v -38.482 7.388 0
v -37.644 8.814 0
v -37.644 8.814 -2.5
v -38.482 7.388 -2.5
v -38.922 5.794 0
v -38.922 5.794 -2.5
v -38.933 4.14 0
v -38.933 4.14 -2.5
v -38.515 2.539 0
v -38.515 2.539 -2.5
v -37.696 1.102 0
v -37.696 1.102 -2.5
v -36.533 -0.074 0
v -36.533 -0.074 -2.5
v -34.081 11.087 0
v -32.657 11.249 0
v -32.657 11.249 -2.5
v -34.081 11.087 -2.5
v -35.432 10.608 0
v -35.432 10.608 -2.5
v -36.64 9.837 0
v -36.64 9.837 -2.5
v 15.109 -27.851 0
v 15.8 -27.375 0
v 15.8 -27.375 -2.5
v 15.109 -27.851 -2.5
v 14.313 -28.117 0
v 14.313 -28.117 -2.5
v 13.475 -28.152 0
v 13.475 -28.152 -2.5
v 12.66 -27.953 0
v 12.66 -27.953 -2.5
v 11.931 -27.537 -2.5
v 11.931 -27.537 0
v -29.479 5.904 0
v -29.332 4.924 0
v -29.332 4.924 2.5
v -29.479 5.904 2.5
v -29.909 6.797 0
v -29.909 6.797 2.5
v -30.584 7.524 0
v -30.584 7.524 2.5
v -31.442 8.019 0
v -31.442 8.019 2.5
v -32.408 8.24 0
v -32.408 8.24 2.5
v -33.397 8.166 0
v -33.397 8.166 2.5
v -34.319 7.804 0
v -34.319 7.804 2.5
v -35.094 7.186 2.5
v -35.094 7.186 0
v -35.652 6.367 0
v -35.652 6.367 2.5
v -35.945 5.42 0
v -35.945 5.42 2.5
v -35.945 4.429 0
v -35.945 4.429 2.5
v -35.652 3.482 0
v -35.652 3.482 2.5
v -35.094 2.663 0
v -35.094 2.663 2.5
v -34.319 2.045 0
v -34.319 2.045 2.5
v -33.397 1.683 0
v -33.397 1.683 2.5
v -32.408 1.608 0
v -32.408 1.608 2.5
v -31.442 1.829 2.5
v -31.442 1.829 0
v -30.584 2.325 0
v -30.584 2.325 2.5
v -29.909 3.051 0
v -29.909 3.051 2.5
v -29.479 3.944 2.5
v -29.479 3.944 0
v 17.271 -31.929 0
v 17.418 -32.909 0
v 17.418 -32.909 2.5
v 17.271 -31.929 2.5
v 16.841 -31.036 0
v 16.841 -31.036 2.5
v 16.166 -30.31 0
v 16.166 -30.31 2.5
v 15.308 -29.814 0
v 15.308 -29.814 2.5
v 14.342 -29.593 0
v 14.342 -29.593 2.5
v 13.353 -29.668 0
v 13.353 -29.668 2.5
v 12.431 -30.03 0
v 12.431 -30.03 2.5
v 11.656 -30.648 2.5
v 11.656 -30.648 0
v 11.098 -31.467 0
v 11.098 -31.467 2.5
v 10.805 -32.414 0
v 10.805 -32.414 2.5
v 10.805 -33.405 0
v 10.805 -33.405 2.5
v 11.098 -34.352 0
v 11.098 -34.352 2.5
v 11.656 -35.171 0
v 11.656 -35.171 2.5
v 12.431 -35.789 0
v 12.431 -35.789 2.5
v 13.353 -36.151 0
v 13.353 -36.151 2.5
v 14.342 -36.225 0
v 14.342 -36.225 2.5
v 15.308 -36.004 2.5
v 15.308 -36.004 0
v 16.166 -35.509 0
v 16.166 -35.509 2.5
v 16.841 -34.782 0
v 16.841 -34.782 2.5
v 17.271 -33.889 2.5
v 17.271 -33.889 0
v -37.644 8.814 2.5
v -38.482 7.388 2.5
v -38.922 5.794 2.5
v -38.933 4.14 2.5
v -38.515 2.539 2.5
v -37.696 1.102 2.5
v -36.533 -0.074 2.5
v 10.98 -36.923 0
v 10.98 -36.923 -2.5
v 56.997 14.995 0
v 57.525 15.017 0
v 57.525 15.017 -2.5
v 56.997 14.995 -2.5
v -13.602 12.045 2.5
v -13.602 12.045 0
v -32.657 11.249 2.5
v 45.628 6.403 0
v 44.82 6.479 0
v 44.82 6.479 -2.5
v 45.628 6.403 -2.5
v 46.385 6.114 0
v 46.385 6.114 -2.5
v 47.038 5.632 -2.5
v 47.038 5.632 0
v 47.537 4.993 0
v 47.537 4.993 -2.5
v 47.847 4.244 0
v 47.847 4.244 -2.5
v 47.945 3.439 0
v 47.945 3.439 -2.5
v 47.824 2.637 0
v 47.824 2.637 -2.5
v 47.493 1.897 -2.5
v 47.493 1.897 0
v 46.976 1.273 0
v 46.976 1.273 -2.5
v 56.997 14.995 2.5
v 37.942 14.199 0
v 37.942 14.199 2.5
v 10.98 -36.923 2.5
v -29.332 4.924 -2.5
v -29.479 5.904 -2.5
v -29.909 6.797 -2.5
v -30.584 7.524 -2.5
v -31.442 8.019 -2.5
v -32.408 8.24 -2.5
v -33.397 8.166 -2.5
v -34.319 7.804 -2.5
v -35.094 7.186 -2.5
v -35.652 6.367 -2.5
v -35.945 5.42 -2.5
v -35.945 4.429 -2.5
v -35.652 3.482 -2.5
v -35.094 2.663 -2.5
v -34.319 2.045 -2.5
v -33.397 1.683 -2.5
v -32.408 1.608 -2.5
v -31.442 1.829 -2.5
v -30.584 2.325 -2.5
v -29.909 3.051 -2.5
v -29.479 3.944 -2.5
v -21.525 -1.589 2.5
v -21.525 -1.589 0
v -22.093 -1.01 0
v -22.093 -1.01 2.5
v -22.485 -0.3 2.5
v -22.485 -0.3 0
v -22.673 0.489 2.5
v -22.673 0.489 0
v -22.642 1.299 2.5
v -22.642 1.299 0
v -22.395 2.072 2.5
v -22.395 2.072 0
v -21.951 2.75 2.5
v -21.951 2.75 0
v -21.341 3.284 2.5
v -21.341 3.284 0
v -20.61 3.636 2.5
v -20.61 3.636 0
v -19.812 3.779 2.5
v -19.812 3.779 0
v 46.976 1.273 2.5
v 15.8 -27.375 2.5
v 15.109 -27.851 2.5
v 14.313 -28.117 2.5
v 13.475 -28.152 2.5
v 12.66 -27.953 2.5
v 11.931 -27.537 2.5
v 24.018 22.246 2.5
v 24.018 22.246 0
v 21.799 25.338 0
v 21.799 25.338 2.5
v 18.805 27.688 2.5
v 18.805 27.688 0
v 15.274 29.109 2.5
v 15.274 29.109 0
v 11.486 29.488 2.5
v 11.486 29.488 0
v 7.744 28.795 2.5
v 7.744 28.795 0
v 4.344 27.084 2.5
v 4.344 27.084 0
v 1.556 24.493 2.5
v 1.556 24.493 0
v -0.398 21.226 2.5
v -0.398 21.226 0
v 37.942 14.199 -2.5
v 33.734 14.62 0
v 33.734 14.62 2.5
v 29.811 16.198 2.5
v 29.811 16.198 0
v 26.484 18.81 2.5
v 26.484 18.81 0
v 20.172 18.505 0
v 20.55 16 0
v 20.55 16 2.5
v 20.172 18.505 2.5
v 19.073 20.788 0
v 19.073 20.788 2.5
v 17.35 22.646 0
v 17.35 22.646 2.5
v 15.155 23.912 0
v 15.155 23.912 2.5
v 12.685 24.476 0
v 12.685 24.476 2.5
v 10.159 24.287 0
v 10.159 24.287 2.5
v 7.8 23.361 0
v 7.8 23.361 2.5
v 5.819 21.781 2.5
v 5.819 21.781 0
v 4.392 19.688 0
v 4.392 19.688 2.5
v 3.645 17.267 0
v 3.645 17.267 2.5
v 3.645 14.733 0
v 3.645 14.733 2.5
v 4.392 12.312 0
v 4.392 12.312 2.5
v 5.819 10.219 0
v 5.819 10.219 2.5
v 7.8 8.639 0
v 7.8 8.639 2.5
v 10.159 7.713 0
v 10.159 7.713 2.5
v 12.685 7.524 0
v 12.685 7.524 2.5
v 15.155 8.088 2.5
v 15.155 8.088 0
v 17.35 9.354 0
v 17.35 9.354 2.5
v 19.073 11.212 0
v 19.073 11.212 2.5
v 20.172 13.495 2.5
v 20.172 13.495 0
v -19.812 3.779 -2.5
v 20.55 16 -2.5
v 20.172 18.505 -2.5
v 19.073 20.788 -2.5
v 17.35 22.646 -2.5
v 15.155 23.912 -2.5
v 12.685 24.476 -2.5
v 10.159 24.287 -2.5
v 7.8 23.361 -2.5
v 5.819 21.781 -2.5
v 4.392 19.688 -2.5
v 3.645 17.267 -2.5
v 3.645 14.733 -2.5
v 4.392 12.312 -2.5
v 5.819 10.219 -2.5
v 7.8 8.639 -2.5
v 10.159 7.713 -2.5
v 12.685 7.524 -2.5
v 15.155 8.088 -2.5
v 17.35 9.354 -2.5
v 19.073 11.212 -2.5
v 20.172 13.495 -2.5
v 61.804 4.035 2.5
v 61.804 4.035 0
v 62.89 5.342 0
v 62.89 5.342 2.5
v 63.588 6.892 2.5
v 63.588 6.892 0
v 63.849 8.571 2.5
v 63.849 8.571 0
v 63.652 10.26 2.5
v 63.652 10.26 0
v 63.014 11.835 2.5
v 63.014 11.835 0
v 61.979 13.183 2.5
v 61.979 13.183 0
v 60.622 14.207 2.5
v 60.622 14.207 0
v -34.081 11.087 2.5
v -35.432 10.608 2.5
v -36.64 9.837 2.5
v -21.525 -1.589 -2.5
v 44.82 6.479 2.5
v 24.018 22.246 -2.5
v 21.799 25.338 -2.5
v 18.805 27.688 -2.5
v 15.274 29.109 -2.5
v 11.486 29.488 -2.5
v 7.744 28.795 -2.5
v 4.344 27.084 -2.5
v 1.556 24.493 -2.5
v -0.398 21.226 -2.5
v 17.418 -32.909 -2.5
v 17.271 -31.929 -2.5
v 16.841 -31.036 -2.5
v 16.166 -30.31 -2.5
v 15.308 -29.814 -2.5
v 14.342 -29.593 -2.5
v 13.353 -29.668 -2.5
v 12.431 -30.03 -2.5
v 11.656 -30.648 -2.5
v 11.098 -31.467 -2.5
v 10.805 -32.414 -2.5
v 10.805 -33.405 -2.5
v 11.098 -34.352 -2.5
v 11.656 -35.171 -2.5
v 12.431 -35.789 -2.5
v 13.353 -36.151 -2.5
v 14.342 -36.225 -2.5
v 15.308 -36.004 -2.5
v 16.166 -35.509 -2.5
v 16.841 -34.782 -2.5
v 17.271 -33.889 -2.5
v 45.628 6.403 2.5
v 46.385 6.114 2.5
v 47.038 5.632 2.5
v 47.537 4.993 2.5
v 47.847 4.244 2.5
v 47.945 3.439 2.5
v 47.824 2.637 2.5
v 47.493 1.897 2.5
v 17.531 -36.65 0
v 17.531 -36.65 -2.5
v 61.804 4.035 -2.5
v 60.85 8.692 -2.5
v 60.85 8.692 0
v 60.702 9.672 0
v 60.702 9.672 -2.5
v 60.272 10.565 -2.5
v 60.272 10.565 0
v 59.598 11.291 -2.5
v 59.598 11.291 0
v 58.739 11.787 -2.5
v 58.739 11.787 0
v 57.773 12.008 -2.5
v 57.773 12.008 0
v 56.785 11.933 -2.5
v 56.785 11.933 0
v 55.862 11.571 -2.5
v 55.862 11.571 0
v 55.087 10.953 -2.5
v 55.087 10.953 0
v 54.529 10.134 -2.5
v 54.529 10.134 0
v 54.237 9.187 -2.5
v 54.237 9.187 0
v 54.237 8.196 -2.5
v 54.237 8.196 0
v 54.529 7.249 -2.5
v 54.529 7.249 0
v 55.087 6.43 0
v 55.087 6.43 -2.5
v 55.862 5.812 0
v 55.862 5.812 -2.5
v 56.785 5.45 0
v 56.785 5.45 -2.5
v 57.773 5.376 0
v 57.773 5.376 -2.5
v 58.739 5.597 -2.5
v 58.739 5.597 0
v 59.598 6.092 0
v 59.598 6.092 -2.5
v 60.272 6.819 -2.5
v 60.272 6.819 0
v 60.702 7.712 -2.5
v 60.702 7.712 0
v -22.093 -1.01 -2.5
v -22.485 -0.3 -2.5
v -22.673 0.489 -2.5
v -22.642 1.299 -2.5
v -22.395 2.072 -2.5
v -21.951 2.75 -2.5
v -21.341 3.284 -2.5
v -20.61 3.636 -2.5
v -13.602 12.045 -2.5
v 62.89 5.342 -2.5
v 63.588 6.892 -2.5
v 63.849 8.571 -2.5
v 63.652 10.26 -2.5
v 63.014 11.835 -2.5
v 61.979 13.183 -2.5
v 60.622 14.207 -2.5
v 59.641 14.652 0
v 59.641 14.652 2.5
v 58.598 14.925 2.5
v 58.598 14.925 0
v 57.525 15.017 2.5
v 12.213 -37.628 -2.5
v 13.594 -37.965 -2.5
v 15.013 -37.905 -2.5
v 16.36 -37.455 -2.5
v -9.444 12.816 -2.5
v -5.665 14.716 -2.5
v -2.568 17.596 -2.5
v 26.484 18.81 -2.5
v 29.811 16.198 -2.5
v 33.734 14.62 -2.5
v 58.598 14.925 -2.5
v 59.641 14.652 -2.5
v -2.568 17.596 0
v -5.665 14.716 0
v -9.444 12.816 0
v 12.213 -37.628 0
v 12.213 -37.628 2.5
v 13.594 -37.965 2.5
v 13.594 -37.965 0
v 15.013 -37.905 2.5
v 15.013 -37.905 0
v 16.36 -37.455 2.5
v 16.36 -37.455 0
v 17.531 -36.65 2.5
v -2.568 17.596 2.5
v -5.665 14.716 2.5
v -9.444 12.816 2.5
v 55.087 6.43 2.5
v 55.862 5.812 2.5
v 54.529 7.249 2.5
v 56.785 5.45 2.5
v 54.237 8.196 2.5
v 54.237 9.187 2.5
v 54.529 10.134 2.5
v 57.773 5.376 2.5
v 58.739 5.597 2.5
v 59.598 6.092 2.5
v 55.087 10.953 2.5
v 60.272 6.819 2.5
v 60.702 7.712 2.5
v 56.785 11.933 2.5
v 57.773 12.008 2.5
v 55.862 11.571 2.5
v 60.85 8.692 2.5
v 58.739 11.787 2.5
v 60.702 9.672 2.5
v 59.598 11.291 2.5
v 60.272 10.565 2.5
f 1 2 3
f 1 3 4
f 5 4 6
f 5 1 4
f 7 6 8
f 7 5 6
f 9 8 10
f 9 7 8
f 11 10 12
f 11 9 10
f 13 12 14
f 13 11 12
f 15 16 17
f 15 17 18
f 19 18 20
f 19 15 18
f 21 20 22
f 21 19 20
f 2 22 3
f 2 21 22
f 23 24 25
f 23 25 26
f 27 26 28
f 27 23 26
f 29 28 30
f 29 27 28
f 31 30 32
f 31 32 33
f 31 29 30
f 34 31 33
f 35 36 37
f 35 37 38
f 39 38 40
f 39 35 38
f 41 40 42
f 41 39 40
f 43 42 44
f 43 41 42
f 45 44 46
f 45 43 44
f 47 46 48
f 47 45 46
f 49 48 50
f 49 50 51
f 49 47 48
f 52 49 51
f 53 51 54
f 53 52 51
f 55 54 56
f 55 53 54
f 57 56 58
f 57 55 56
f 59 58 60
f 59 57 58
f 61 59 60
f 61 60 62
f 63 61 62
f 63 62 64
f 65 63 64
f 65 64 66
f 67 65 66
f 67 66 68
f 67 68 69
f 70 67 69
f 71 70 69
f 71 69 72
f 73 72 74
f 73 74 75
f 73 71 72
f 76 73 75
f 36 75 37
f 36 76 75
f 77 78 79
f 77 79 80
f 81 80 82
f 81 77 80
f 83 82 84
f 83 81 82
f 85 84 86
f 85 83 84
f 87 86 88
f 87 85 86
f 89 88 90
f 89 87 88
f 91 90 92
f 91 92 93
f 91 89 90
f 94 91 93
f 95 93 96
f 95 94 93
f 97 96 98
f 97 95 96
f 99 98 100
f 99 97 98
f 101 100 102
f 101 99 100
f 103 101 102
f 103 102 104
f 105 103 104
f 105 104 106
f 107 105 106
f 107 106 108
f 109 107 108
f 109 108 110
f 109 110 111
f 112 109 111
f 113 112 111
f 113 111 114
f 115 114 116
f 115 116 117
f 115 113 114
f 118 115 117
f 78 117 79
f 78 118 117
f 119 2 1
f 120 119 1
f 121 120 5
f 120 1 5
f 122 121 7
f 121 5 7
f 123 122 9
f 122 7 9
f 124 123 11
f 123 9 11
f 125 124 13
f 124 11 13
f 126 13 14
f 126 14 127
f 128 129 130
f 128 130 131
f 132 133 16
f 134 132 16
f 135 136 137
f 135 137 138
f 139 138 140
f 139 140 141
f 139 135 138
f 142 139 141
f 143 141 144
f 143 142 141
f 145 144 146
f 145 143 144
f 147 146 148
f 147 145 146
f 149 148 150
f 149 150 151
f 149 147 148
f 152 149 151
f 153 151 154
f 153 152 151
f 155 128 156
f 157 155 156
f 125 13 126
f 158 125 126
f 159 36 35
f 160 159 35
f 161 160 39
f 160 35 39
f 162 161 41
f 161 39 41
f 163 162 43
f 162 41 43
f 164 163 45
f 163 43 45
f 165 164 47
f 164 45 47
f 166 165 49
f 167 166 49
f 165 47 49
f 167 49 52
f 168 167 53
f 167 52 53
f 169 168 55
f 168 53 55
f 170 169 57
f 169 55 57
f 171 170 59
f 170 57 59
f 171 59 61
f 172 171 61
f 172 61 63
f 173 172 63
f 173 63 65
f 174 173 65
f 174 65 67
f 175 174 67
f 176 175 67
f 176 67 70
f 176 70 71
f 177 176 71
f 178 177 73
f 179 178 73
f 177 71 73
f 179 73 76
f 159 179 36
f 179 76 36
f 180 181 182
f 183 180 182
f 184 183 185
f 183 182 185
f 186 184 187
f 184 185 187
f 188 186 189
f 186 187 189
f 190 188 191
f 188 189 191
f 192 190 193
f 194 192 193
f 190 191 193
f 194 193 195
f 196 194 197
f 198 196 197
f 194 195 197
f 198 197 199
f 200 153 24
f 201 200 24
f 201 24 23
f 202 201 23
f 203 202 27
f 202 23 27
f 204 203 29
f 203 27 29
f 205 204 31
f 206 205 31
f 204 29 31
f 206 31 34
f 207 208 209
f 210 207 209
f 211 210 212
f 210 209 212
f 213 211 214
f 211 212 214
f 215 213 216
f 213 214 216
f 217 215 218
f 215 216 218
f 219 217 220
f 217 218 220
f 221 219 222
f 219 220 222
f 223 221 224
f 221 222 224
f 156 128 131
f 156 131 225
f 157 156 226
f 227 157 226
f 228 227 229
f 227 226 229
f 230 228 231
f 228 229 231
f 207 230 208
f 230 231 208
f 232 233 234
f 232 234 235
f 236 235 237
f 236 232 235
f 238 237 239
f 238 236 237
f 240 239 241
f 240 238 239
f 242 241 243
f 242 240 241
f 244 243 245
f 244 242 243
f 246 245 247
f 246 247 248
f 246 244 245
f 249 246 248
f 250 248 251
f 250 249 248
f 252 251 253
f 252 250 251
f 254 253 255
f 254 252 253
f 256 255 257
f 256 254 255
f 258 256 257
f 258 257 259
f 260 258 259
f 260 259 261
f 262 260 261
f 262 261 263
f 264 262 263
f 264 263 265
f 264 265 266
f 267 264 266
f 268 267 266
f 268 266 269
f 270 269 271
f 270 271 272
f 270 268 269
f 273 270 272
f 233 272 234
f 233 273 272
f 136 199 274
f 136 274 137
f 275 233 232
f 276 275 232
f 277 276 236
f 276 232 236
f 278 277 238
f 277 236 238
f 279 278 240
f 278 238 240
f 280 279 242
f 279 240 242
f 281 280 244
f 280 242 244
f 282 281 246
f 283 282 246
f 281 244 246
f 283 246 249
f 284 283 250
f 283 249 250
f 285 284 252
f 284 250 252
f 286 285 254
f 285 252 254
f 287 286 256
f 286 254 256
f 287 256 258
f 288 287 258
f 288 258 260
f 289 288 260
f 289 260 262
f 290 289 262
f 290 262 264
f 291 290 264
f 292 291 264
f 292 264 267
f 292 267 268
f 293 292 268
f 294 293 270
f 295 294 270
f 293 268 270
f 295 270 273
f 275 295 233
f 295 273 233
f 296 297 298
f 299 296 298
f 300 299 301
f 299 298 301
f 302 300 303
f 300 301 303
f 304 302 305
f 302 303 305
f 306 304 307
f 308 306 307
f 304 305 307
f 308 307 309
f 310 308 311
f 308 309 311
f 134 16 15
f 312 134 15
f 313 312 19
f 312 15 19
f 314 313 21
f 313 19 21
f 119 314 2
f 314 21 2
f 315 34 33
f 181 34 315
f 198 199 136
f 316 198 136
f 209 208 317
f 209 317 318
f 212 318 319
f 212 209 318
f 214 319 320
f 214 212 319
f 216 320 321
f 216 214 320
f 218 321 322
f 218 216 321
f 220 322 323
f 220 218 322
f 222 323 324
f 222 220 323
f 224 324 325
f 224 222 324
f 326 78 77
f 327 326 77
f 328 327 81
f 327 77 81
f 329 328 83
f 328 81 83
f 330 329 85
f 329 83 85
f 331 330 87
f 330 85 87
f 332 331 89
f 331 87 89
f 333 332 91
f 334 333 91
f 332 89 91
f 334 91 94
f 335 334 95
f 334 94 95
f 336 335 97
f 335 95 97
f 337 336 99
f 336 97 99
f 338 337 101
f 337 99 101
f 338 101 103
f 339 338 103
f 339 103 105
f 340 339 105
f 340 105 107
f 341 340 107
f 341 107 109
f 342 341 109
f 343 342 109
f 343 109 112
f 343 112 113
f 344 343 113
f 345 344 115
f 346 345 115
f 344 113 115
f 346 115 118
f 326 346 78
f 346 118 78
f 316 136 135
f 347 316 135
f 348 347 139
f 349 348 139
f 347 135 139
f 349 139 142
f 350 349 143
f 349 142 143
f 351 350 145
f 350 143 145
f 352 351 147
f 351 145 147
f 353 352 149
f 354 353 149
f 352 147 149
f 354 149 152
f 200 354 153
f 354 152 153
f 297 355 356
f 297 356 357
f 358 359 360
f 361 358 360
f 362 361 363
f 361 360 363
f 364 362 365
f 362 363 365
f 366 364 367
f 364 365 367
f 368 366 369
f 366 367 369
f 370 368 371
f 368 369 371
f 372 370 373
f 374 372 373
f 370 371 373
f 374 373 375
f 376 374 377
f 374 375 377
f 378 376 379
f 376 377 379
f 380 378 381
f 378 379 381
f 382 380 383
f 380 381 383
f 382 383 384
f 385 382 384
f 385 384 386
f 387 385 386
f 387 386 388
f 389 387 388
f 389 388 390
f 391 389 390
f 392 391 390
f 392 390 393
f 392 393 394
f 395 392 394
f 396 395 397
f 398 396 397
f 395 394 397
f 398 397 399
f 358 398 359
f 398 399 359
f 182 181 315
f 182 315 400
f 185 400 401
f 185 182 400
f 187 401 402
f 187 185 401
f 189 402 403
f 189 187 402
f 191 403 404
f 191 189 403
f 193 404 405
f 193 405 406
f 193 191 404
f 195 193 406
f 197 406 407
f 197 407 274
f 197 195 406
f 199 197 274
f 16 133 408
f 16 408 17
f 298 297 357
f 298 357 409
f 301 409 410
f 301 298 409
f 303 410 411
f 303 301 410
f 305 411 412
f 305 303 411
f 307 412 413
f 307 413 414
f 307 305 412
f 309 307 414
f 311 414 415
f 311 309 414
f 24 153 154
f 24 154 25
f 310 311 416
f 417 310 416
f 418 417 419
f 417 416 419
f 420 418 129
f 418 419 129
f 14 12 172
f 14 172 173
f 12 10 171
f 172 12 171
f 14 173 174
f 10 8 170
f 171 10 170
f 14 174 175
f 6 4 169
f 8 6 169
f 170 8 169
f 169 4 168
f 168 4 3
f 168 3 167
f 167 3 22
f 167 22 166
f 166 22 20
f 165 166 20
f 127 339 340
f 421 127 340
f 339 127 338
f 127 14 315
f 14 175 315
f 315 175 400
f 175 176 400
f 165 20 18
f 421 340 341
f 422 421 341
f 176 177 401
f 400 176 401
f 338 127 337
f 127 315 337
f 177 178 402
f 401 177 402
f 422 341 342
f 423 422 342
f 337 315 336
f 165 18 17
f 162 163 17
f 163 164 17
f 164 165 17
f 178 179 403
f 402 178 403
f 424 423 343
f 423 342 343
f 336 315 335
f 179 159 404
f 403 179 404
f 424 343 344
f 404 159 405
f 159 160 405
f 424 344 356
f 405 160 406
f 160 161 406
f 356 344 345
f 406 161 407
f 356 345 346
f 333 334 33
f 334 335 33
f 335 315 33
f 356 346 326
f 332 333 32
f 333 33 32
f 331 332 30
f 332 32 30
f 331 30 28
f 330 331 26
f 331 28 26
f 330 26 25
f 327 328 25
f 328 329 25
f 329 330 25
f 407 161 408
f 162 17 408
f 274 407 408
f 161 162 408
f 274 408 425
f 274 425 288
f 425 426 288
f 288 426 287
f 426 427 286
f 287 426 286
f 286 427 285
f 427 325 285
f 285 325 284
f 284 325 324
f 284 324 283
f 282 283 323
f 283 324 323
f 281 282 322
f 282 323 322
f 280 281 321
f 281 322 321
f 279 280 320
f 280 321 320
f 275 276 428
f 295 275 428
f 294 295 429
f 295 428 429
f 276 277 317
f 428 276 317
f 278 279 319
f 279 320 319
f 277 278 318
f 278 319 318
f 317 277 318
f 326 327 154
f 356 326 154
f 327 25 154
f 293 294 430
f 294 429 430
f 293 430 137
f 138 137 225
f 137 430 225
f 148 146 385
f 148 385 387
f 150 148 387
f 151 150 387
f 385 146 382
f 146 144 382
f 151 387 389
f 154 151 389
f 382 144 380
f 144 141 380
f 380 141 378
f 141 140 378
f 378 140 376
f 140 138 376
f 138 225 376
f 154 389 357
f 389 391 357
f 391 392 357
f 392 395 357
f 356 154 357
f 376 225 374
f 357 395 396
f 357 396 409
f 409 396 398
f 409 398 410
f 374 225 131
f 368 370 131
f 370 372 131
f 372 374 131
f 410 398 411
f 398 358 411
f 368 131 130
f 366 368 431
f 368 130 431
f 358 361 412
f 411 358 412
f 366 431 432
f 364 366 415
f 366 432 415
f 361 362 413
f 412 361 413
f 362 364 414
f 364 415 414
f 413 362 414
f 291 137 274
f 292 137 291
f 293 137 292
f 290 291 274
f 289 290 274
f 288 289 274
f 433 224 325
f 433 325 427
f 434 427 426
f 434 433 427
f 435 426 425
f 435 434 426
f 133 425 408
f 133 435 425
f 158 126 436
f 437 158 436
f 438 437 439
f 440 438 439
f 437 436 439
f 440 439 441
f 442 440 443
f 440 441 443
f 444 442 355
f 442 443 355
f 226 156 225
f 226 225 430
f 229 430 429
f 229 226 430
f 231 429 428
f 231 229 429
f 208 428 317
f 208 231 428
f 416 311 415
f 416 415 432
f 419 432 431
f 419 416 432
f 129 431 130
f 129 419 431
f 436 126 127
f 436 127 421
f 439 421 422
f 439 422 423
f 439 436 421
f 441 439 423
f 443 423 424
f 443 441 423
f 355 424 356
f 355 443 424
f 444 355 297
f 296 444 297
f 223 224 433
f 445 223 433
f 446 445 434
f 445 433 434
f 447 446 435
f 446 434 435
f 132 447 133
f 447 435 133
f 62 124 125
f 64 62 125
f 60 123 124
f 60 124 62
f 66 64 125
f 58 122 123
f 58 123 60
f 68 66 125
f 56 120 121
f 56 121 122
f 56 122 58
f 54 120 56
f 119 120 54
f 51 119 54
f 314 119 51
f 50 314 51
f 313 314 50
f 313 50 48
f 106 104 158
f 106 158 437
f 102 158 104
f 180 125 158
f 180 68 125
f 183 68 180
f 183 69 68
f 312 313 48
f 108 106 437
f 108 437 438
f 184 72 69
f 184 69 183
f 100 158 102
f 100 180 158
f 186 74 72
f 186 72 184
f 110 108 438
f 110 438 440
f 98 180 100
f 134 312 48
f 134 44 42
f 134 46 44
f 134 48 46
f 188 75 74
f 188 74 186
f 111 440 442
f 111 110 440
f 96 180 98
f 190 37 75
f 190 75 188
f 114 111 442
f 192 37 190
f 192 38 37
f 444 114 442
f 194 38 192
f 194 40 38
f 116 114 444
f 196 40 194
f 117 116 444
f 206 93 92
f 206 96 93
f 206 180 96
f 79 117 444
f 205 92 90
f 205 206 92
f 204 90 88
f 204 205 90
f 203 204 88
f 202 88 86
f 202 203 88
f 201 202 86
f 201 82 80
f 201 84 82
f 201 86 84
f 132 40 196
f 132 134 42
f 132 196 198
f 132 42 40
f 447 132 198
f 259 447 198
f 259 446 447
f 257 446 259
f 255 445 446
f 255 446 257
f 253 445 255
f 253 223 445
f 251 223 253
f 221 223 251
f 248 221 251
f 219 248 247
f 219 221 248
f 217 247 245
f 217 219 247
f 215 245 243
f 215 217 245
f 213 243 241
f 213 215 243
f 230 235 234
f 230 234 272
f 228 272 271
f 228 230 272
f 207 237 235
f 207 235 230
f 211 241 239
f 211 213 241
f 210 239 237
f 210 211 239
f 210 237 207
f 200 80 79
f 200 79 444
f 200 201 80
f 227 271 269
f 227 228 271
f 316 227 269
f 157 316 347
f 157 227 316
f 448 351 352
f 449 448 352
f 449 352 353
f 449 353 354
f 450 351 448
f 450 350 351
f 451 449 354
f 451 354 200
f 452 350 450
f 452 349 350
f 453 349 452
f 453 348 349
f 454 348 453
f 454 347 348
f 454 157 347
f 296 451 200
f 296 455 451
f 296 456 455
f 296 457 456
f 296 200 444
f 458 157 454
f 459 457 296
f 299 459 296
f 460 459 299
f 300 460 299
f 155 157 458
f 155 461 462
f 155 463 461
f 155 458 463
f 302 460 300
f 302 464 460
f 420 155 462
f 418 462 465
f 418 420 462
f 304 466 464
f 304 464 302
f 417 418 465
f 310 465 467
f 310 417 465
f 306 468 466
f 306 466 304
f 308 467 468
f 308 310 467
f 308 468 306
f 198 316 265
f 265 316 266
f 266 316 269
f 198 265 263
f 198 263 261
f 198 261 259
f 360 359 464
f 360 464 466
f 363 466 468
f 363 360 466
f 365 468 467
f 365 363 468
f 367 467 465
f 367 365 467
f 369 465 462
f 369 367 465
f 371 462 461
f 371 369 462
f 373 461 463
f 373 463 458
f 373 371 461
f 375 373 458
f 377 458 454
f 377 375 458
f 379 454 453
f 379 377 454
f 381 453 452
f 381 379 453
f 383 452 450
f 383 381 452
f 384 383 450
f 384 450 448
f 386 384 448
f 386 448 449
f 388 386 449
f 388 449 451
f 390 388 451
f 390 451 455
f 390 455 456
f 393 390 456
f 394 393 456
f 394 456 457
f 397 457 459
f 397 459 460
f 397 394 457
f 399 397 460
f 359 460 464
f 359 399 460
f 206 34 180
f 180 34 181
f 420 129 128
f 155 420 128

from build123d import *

# Parameters (mm, degrees)
SKETCH1_R           = 3.325
SKETCH1_R_2         = 8.5
BOSS_EXTRUDE1_DEPTH = 2.5


with BuildPart() as part:
    # Sketch1 → Boss-Extrude1 (new, symmetric)
    with BuildSketch(Plane.XY):
        with BuildLine():
            ThreePointArc((60.622067271, 14.206532436), (59.125498335, 14.810906809), (57.524692071, 15.016834632))
            Line((57.524692071, 15.016834632), (56.997116089, 14.994793348))
            Line((56.997116089, 14.994793348), (37.942484943, 14.198721238))
            ThreePointArc((37.942484943, 14.198721238), (29.810784304, 16.198484397), (24.018273447, 22.245833067))
            ThreePointArc((24.018273447, 22.245833067), (11.4864831, 29.488233713), (-0.397539124, 21.225779345))
            ThreePointArc((-0.397539124, 21.225779345), (-5.665447564, 14.71634399), (-13.602008261, 12.045274491))
            Line((-13.602008261, 12.045274491), (-32.656639407, 11.249202381))
            ThreePointArc((-32.656639407, 11.249202381), (-35.431571333, 10.60798438), (-37.643867273, 8.81434161))
            ThreePointArc((-37.643867273, 8.81434161), (-38.932803958, 4.139738531), (-36.53293032, -0.073796594))
            Line((-36.53293032, -0.073796594), (10.980057512, -36.923376572))
            ThreePointArc((10.980057512, -36.923376572), (14.305396611, -37.984745832), (17.530617501, -36.649704619))
            Line((17.530617501, -36.649704619), (61.804364137, 4.034578786))
            ThreePointArc((61.804364137, 4.034578786), (63.807395856, 9.422079897), (60.622067271, 14.206532436))
        make_face()
        with Locations((14.093347289, -32.909173442)):
            Circle(SKETCH1_R, mode=Mode.SUBTRACT)
        with BuildLine():
            Line((-19.81205116, 3.778850103), (44.820399723, 6.479090855))
            ThreePointArc((44.820399723, 6.479090855), (47.71753436, 4.629103679), (46.975509685, 1.272730481))
            Line((46.975509685, 1.272730481), (15.799754589, -27.375471944))
            ThreePointArc((15.799754589, -27.375471944), (13.895096583, -28.163882109), (11.93131365, -27.537089238))
            Line((11.93131365, -27.537089238), (-21.525382137, -1.589127566))
            ThreePointArc((-21.525382137, -1.589127566), (-22.544780206, 1.693656197), (-19.81205116, 3.778850103))
        make_face(mode=Mode.SUBTRACT)
        with Locations((-32.656639407, 4.924202381)):
            Circle(SKETCH1_R, mode=Mode.SUBTRACT)
        with Locations((12.05, 16)):
            Circle(SKETCH1_R_2, mode=Mode.SUBTRACT)
        with Locations((57.524692071, 8.691834632)):
            Circle(SKETCH1_R, mode=Mode.SUBTRACT)
    extrude(amount=BOSS_EXTRUDE1_DEPTH, both=True)


solid = part.part
